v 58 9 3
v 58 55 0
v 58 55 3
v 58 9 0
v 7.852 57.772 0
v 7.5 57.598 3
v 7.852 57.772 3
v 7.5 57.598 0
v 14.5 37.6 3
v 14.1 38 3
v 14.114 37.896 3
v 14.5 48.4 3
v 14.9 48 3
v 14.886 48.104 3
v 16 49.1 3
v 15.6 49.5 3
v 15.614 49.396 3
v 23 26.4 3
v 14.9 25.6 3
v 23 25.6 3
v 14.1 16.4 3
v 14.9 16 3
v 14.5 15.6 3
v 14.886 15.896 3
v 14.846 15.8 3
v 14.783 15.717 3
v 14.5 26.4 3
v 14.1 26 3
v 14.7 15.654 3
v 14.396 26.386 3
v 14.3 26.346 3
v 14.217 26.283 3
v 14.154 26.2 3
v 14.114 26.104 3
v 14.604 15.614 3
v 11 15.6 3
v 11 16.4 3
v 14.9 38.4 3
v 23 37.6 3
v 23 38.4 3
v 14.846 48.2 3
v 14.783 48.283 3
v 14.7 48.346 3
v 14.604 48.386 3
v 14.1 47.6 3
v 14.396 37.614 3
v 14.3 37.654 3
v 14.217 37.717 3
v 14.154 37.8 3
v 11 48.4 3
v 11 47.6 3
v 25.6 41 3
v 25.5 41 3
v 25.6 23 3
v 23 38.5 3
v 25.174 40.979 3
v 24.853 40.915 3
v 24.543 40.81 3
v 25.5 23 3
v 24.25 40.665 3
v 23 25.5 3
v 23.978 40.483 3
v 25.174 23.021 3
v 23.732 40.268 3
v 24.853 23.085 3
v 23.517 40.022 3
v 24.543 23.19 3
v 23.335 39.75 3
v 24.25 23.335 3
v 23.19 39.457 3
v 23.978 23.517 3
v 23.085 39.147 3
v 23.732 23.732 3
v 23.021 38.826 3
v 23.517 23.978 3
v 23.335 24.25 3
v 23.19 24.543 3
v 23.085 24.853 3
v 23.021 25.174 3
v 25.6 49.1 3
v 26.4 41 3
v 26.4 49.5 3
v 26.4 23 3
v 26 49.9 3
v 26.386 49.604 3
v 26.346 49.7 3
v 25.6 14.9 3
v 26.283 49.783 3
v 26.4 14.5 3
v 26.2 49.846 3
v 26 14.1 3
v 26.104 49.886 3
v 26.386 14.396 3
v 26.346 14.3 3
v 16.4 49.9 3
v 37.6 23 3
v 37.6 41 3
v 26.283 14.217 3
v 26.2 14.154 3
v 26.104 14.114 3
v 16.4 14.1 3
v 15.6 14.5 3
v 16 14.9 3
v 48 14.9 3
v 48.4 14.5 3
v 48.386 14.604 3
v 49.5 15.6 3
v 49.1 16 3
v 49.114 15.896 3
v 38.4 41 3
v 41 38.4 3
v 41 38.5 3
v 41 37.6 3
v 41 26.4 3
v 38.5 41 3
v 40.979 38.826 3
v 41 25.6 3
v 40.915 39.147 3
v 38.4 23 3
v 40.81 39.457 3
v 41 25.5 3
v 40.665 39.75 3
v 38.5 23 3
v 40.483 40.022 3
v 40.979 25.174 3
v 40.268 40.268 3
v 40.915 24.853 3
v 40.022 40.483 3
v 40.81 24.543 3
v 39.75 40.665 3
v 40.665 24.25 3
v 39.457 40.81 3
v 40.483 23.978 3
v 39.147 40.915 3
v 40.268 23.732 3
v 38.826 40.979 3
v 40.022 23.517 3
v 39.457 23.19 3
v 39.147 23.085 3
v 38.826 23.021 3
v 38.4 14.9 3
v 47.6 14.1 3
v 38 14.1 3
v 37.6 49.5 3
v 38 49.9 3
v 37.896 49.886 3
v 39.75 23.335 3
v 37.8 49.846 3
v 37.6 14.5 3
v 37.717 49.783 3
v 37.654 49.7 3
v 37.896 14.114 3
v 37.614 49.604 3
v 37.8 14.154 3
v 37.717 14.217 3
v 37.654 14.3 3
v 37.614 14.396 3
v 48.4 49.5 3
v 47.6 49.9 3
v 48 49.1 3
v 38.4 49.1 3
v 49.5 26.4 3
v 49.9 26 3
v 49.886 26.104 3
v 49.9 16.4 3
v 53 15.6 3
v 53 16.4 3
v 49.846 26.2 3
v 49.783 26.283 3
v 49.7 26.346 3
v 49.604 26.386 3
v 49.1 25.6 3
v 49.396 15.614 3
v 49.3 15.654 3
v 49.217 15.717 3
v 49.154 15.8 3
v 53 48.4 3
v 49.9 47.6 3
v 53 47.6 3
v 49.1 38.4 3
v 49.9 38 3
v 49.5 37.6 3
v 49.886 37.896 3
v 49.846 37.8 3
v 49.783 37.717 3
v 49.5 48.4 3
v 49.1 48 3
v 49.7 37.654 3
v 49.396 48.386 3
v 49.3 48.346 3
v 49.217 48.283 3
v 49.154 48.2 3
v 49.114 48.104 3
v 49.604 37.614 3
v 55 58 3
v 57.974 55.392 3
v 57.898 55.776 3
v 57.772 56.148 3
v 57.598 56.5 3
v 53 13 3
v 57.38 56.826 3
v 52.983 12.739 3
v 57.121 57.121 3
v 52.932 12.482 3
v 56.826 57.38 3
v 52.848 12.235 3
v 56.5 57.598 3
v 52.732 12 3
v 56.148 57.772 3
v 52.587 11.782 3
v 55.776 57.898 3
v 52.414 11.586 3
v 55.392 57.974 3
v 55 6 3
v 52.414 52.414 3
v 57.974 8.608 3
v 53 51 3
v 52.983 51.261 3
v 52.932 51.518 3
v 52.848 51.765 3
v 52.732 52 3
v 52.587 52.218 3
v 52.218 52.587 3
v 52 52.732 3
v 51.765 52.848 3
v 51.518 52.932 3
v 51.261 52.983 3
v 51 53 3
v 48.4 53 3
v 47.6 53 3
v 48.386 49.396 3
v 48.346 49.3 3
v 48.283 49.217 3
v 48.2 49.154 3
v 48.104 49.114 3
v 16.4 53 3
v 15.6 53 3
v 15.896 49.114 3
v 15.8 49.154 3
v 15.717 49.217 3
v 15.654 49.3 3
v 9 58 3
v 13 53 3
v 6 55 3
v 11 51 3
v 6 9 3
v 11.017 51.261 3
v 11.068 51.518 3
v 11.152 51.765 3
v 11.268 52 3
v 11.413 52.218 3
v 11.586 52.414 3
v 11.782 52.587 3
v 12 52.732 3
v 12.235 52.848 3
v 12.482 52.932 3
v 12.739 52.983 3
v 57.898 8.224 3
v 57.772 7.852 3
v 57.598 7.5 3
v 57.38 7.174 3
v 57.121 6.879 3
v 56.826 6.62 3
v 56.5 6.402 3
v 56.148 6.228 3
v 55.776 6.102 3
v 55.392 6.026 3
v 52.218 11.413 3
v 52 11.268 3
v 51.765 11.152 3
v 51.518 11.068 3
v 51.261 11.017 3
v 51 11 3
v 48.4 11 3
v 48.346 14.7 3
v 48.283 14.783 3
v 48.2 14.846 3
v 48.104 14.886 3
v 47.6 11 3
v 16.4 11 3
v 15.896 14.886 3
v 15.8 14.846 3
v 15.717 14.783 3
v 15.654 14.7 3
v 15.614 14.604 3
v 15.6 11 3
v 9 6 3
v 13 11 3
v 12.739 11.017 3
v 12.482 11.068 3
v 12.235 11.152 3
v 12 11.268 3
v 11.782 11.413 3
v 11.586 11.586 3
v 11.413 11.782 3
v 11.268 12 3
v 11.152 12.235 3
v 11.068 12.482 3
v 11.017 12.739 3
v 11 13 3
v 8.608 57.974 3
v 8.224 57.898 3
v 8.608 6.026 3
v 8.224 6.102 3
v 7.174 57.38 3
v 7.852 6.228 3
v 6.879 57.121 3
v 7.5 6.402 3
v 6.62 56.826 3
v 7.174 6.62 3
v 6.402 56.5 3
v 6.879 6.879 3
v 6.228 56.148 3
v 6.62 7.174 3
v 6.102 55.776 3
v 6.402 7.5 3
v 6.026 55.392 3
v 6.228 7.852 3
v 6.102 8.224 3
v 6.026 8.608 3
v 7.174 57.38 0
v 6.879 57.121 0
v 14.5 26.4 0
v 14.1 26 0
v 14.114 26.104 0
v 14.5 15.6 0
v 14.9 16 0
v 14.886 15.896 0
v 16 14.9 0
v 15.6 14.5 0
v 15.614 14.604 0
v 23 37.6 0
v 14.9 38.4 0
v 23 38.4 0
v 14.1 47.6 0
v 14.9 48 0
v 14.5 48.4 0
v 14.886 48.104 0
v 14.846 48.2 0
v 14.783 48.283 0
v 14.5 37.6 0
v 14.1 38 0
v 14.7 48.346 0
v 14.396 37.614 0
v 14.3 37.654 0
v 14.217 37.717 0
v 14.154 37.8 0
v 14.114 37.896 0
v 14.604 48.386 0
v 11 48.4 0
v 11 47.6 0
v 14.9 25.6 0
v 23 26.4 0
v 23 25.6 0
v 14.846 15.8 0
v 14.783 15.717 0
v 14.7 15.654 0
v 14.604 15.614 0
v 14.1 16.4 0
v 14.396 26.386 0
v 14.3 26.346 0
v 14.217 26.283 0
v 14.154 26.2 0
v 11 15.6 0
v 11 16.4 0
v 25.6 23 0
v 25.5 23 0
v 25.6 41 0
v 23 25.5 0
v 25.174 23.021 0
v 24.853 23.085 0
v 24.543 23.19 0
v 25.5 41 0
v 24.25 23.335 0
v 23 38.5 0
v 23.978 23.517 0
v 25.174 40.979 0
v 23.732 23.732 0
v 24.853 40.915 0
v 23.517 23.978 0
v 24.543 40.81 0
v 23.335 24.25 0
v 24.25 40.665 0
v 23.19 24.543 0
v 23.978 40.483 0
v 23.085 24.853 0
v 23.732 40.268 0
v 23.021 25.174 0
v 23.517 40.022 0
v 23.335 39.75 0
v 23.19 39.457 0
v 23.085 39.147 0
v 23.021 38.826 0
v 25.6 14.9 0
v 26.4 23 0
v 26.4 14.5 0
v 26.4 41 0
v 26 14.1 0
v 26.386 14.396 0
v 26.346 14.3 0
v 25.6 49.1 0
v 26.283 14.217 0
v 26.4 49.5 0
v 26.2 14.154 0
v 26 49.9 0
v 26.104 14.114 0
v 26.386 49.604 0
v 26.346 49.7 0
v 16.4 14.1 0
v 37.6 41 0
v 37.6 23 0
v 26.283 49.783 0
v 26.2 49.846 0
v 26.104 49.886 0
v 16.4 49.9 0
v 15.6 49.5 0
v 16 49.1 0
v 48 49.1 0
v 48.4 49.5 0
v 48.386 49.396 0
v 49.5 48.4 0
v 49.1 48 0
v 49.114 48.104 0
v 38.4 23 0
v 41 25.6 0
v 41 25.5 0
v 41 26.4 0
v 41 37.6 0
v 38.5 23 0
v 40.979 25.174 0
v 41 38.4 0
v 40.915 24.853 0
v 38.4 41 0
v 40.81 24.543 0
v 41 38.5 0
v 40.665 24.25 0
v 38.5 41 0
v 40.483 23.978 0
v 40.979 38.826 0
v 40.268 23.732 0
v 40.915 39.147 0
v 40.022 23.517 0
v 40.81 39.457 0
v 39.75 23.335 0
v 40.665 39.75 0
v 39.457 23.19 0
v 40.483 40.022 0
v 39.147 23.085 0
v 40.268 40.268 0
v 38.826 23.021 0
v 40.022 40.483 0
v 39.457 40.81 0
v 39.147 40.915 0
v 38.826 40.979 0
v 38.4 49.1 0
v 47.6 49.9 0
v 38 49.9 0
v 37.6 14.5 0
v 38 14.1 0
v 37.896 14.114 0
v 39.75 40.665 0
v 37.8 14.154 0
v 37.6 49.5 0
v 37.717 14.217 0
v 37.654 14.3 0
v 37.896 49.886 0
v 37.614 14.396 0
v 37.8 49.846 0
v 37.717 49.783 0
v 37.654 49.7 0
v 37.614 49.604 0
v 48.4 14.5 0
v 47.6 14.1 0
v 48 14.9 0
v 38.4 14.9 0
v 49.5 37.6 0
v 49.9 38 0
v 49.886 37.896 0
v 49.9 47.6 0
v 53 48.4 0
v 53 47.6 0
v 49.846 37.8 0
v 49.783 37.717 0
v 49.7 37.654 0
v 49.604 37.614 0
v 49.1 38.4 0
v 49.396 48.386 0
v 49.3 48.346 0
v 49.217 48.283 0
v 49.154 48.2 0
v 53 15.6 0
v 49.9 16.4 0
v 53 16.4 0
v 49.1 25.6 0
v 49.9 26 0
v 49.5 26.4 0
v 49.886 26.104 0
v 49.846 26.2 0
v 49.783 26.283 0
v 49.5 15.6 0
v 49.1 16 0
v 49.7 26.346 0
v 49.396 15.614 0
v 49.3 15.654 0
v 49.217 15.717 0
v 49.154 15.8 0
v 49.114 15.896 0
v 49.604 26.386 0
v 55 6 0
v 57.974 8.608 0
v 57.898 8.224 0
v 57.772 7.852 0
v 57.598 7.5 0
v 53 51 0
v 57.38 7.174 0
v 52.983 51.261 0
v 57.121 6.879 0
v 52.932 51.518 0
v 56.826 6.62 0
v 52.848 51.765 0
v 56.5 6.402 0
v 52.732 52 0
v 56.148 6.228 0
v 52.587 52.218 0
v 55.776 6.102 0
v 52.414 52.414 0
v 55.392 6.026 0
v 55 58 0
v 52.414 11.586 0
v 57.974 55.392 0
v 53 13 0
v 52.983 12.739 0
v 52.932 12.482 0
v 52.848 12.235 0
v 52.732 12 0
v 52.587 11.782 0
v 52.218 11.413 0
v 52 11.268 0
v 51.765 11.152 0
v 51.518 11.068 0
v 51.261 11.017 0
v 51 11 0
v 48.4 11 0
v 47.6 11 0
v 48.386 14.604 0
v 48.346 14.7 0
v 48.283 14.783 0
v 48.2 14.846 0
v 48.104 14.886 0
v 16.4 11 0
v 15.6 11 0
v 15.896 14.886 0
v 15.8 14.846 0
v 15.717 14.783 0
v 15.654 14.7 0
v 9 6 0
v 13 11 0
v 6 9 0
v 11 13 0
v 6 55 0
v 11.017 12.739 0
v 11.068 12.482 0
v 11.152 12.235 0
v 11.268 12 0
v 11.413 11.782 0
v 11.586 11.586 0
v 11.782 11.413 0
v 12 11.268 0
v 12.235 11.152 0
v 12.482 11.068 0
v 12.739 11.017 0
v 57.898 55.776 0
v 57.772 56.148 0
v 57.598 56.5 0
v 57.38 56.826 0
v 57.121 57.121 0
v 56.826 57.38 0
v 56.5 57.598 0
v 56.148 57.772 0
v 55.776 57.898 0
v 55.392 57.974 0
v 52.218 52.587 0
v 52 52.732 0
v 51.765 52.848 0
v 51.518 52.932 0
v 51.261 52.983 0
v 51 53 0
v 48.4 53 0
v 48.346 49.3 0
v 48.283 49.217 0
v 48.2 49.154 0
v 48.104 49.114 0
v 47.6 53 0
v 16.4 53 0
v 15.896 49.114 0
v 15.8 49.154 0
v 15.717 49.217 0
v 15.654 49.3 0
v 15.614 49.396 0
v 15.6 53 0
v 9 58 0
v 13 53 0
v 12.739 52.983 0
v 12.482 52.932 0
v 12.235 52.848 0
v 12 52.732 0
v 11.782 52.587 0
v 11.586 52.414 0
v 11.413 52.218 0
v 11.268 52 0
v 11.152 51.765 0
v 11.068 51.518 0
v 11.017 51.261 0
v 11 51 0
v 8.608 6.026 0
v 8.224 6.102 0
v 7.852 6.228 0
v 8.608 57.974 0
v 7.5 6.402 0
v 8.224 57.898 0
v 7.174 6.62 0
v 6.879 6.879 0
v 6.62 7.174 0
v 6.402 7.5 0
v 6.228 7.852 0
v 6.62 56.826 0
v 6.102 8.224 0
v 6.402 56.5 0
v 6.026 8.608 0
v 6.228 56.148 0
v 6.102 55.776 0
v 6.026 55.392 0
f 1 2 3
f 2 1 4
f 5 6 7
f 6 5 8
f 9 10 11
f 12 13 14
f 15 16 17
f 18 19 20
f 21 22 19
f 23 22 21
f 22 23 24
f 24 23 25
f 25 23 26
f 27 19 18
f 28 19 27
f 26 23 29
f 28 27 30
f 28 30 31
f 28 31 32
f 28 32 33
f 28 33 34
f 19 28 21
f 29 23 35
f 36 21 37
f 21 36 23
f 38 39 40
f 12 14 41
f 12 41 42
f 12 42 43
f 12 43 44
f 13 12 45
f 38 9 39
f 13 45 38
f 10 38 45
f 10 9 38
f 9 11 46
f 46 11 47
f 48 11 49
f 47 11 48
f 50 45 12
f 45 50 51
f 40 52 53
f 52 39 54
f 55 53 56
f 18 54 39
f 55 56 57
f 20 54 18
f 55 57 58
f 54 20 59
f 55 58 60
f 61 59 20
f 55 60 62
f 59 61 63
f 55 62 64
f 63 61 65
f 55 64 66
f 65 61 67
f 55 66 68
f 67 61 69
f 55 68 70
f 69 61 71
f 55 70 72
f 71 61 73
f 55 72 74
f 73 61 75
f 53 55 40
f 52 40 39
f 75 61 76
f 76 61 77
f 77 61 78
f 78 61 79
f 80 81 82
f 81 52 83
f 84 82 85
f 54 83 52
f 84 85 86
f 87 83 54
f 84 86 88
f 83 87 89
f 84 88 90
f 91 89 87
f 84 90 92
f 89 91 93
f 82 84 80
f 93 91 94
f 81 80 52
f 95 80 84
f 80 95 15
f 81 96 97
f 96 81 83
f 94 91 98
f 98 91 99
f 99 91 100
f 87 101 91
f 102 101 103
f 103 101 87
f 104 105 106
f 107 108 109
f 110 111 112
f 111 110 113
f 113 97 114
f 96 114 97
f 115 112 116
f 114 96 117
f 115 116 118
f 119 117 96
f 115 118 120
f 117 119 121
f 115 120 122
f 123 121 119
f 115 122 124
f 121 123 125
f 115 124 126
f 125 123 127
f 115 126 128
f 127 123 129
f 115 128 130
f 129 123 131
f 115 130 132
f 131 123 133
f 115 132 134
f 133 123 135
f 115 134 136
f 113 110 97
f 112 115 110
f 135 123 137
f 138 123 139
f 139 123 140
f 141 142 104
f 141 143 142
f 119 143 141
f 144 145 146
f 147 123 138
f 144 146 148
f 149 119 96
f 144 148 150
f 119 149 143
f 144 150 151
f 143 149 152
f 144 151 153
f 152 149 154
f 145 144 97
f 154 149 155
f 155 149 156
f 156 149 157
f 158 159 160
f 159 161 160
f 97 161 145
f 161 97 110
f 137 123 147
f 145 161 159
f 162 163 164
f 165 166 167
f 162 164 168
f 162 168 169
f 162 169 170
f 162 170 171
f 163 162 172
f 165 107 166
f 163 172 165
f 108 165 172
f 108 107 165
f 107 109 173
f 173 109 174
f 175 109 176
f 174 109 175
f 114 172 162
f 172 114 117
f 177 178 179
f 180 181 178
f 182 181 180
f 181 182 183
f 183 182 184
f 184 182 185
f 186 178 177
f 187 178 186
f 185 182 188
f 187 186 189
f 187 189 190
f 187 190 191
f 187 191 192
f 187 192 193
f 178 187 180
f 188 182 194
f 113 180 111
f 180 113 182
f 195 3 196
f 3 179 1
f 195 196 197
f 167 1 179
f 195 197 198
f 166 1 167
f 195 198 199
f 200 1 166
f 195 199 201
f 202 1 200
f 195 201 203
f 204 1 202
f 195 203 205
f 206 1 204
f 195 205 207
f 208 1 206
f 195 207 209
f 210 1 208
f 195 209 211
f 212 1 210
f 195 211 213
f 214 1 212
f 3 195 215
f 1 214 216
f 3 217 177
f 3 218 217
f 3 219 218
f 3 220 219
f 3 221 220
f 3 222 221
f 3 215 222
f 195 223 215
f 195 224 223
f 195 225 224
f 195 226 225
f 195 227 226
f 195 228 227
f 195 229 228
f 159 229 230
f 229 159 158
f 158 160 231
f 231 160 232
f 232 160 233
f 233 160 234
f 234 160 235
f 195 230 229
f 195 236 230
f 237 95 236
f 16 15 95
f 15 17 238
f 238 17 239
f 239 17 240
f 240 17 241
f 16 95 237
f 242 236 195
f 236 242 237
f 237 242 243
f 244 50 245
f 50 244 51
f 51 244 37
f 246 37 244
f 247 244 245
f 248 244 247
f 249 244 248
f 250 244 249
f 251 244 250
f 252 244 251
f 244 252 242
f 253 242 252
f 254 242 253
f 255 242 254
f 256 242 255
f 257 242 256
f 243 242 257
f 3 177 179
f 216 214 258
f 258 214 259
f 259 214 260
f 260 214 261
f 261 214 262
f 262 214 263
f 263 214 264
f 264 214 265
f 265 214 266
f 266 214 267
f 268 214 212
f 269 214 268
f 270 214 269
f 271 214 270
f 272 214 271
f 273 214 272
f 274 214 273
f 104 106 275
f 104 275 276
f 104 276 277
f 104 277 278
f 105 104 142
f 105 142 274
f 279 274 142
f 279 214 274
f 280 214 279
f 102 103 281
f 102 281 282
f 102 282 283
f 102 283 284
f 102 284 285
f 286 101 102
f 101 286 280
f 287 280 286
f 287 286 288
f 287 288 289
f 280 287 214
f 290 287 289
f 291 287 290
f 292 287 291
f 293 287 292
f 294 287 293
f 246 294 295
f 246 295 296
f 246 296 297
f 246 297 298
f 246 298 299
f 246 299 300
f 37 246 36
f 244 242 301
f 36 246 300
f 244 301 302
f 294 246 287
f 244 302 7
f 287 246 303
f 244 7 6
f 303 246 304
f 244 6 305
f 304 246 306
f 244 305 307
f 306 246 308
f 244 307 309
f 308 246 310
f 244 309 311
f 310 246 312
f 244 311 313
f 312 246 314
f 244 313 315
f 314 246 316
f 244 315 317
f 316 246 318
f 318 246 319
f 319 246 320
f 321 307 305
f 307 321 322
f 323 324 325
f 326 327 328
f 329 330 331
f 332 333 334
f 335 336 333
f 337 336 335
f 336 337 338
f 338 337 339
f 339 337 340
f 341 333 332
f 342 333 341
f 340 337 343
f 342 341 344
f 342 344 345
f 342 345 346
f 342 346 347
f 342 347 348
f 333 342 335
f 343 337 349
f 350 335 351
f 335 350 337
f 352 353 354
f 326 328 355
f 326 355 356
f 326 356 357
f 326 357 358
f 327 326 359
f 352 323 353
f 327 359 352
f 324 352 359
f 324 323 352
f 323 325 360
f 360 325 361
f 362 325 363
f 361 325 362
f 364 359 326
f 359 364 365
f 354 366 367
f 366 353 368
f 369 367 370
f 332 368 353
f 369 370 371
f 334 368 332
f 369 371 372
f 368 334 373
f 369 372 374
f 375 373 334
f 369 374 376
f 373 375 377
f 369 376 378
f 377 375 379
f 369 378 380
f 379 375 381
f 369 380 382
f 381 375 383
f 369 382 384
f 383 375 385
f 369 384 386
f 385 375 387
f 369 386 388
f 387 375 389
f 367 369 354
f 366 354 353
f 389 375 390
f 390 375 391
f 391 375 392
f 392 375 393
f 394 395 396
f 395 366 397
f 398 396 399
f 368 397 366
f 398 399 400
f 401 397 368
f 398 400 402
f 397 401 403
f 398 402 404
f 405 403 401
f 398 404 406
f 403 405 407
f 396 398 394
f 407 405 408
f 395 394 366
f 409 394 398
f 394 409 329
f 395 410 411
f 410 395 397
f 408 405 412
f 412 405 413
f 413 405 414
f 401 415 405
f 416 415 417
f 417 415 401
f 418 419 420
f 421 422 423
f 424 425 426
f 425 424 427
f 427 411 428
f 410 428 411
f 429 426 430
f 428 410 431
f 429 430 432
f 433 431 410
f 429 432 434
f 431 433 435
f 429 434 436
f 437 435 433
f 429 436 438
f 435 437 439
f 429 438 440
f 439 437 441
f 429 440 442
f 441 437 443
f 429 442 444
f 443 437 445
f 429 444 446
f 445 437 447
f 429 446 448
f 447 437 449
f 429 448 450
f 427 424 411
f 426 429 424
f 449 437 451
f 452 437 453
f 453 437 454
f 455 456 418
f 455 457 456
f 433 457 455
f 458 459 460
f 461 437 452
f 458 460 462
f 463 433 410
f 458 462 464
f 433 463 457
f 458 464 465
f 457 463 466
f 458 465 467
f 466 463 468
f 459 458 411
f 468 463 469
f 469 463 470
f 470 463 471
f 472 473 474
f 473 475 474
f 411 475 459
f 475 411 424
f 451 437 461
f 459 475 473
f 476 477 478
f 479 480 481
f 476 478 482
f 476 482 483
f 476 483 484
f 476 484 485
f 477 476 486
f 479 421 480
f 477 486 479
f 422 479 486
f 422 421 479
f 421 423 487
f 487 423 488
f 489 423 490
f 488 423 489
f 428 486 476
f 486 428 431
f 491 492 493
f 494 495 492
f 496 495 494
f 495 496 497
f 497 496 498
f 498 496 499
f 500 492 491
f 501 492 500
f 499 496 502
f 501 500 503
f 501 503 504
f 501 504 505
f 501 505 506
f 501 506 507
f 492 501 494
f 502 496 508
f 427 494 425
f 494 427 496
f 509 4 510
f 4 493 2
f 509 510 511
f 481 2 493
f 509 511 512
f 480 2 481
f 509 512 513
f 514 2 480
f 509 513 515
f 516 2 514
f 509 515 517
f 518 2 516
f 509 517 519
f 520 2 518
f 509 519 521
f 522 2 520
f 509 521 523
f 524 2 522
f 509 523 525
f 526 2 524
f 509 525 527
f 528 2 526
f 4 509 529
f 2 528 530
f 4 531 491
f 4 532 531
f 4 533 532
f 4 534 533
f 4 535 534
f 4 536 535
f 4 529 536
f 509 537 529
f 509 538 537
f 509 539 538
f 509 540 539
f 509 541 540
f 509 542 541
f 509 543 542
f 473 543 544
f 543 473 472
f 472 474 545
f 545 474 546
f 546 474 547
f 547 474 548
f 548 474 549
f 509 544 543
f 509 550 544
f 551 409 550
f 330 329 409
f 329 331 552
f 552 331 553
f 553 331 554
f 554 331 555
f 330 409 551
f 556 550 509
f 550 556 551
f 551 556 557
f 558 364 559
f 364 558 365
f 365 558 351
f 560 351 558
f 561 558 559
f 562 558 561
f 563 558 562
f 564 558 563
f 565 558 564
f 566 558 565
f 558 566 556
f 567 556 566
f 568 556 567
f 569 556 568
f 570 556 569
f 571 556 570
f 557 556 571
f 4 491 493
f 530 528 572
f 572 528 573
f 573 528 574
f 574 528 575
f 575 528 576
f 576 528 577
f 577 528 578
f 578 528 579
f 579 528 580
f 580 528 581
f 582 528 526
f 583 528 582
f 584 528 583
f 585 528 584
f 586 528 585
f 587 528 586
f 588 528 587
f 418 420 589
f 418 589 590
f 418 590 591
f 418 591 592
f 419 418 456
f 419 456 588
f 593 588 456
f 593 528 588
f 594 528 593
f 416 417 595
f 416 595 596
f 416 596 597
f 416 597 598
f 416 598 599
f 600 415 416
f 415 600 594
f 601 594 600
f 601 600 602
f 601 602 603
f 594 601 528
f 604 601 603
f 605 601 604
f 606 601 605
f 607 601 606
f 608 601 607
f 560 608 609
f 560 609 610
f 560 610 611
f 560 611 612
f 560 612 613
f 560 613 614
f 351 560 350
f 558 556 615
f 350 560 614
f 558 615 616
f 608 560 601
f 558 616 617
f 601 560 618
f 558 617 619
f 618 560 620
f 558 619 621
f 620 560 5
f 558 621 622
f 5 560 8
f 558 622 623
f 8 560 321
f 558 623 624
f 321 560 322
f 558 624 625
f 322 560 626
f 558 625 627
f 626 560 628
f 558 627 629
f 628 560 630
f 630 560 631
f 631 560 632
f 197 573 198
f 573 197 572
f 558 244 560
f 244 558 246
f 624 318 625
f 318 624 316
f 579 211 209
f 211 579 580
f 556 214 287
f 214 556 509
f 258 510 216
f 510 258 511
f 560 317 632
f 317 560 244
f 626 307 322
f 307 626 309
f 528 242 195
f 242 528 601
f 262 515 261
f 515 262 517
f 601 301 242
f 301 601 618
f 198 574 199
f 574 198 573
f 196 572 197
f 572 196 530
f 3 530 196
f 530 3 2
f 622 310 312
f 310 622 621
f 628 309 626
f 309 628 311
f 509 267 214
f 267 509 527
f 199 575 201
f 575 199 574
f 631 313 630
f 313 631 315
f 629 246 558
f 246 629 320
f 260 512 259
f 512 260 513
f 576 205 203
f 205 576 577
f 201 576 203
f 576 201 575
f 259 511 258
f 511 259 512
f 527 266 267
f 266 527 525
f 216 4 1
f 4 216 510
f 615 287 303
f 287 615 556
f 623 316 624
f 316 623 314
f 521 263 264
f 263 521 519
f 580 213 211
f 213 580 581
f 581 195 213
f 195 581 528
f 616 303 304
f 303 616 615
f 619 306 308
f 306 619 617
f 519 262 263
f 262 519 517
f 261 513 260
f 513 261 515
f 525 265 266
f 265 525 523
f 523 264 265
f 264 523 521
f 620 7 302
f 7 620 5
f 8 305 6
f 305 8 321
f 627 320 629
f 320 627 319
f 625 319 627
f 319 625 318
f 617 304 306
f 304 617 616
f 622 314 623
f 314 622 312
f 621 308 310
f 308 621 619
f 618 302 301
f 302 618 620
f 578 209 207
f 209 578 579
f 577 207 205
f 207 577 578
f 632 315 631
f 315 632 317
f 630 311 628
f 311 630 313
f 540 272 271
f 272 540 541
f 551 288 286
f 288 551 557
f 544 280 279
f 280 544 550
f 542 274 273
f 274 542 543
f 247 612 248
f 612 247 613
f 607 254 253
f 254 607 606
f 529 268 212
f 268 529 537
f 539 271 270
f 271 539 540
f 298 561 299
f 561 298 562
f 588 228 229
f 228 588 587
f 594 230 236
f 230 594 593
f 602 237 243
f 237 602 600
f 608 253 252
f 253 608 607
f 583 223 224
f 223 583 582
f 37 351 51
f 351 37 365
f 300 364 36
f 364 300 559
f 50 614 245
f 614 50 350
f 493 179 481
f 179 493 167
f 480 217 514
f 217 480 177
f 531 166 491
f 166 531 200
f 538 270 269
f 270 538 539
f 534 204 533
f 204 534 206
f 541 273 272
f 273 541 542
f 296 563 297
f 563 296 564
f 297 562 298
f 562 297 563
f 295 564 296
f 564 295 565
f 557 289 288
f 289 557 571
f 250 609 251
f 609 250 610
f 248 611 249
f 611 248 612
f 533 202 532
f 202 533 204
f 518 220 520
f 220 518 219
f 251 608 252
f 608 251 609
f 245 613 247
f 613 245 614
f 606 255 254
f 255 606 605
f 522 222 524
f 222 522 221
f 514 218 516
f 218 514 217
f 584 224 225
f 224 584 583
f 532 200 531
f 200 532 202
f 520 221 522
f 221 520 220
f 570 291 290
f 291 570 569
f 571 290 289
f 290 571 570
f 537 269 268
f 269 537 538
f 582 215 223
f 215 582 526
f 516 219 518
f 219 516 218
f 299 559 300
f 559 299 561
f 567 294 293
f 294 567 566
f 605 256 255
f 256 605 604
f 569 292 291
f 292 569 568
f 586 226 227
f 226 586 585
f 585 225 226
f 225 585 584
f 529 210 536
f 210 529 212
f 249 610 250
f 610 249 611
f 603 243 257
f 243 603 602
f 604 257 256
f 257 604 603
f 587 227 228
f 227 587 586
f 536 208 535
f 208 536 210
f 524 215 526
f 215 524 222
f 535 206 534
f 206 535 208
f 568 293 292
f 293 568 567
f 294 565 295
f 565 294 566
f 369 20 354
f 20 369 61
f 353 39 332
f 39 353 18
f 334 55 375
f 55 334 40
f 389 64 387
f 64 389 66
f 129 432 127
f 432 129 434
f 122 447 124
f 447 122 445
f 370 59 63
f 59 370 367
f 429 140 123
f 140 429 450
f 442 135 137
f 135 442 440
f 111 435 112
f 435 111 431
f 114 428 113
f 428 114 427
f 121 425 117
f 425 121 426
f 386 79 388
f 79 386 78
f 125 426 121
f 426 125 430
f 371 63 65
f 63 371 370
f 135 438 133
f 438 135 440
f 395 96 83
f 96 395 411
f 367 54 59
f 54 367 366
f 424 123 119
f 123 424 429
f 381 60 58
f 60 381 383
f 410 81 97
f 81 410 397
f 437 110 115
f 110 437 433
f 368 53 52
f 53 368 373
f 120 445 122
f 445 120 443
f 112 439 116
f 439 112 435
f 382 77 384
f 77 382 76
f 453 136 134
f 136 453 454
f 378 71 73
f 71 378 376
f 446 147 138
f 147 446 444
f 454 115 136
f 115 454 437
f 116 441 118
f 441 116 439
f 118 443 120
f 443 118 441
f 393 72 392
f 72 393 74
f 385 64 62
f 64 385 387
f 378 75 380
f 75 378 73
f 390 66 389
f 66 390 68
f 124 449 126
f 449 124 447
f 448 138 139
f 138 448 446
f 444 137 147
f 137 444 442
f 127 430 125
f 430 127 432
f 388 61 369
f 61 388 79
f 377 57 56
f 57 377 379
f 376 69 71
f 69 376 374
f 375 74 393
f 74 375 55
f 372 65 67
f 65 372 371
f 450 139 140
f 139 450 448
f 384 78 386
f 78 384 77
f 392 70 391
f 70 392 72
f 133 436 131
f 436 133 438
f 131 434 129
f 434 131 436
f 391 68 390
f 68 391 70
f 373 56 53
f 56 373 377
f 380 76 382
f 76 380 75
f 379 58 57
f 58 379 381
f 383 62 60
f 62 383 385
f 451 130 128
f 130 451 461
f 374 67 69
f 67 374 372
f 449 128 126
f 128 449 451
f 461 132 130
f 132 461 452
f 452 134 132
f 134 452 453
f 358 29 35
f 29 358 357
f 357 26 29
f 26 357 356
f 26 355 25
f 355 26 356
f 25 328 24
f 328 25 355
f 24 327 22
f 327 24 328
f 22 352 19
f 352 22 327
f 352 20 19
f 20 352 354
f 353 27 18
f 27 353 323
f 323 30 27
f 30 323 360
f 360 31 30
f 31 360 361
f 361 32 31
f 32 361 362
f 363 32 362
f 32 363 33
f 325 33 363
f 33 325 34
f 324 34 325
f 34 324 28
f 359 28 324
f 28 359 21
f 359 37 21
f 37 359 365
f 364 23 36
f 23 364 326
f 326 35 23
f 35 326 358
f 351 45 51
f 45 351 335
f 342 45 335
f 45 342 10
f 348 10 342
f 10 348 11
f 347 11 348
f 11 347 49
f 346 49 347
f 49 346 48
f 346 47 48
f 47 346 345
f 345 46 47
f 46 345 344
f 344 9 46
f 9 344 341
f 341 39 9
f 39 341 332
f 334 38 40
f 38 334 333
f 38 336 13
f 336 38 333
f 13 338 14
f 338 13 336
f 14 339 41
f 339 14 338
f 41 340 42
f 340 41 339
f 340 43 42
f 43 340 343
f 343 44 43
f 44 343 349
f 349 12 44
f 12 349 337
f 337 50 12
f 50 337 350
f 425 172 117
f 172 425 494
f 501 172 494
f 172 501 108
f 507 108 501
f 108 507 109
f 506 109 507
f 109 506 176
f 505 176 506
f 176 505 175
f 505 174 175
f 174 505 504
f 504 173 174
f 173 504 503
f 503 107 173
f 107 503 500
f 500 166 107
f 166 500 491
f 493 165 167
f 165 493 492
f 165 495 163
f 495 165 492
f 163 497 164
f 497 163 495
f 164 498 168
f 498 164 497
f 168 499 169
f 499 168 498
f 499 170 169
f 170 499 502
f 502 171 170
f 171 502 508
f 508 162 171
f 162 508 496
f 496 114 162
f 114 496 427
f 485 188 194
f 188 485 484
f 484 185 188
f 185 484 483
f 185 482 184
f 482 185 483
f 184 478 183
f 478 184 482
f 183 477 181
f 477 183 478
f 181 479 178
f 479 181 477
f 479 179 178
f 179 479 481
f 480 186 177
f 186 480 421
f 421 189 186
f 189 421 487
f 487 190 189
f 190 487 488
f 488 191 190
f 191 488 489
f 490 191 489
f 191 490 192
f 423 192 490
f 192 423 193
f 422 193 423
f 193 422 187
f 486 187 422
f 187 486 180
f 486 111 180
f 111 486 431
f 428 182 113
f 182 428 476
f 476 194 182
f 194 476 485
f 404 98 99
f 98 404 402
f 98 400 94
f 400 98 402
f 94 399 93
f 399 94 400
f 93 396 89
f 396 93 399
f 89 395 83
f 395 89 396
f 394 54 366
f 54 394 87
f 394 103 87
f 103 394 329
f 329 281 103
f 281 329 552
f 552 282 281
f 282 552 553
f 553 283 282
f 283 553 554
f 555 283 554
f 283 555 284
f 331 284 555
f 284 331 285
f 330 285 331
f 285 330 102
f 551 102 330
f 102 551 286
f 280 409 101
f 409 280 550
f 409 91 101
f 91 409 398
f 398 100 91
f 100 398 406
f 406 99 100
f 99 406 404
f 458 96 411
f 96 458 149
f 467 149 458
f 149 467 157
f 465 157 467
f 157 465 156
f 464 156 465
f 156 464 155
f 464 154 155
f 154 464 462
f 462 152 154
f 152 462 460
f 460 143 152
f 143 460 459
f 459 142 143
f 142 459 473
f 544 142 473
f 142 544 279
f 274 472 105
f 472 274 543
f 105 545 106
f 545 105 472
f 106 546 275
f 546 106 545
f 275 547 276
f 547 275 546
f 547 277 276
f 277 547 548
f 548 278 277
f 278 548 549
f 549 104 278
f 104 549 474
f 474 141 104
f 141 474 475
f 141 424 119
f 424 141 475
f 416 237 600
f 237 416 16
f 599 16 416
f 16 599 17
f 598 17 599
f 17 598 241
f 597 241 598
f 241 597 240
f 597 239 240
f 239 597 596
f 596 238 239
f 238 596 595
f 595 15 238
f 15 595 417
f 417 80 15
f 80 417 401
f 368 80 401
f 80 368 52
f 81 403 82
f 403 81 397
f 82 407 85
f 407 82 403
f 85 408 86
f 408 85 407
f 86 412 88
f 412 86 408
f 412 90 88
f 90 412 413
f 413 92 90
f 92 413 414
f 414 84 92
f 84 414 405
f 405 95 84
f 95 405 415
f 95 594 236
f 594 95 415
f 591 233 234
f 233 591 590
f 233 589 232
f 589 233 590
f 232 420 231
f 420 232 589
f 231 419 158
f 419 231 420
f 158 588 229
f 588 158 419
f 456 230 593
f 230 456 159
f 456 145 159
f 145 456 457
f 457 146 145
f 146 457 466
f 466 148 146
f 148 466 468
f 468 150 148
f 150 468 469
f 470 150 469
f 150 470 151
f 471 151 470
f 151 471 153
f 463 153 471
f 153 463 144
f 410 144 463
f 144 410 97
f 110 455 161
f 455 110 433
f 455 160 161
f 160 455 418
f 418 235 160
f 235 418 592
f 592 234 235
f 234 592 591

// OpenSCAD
/*
Sample 025: XY-Festkörpertisch — weich 0,8 mm
Generated from the FDM Mechanical Sample Library.
Units: millimetres.

Override examples:
  openscad -o custom.stl -D 'view="plate"' -D 'render_fn=64' model.scad
  openscad -o preview.png -D 'view="assembly"' model.scad
*/
use <../../../library/fdm_mechanisms.scad>

render_fn = is_undef(render_fn) ? 48 : render_fn;
view = is_undef(view) ? "plate" : view;
$fn = render_fn;

sample_xy_flexure_stage(
    view=view,
    beam_w=0.8,
    beam_l=17
);
